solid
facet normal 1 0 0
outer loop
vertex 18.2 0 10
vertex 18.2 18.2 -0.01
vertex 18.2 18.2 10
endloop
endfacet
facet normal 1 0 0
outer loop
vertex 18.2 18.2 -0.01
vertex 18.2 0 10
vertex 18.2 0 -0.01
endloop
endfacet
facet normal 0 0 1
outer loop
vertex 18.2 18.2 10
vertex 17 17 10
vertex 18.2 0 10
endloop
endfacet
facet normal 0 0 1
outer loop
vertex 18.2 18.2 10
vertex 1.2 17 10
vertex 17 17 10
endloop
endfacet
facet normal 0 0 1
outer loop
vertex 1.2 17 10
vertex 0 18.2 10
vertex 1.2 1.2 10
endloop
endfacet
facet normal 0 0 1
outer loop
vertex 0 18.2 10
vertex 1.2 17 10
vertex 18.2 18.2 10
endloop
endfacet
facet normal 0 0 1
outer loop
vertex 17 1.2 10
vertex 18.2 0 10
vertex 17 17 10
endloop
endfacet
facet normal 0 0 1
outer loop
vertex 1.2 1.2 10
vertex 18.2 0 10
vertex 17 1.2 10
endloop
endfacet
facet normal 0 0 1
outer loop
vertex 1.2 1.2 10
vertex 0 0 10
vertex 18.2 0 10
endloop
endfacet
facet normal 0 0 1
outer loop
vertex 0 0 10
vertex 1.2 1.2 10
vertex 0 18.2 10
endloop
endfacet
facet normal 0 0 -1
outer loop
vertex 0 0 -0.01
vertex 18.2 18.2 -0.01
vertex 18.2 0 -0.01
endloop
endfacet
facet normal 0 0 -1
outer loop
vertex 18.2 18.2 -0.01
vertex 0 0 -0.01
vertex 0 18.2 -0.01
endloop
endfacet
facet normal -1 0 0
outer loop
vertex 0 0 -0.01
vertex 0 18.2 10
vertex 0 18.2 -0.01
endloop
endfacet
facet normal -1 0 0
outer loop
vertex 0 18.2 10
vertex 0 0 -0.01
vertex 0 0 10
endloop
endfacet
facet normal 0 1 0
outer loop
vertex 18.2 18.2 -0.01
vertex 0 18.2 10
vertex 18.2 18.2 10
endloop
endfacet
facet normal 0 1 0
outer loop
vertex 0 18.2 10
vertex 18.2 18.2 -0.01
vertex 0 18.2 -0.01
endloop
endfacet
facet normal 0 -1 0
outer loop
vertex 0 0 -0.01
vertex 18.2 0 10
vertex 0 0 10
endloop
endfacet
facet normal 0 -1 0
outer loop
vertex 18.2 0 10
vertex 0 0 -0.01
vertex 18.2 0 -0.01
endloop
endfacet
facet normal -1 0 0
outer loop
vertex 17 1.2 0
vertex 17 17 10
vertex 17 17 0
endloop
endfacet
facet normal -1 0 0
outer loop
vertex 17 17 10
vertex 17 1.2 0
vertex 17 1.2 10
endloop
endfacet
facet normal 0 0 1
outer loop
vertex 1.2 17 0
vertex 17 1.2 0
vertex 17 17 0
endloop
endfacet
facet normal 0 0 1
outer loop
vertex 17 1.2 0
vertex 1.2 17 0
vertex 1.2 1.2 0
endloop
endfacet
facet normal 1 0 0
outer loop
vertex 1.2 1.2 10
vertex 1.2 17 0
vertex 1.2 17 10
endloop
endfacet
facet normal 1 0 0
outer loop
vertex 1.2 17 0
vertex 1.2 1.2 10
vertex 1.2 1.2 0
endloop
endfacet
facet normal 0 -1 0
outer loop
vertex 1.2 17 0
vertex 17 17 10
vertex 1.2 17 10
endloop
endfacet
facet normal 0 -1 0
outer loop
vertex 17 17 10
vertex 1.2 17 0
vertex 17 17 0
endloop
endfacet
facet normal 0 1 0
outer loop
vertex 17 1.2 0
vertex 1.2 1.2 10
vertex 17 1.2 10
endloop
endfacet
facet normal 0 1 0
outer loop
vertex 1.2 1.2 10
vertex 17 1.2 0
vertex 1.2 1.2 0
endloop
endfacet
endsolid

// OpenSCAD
// file: ../Base/Boxes.scad
// Fischertechnik Box Foundation
// Pre-designed Boxes

use <Constants.scad>

include <PlacementOptions.scad>

box190Width = 190;
box190Depth = 130;
box130Width = 130;
box130Depth = 95;
boxUsageHeight = 33.9;
boxWallThickness = 2.4;
boxBaseThickness = 1.0;

// getBoxWallThickness()
// Gets the wall thickness of a Fischertechnik Box

function getBoxWallThickness() = boxWallThickness;

// Gets the usable height of a fischertechnik box
function getBoxUsageHeight() = boxUsageHeight;

// Gets the thickness of the Fischertechnik box base.
function getBoxBaseThickness() = boxBaseThickness;

// Gets the usable inner space of a Box 190 as an x/y-list
function getBox190Space() = [
    box190Width - 2*getBoxWallThickness(), 
    box190Depth - 2*getBoxWallThickness() ];

// Imports the Fischertechnik empty box 130x190 mm and places it at position 0,0
// 190x130 are the outer sizes, the inner space is slightly smaller. Use getBox190Space() to get the inner sizes.
// This module needs the STL file "Fischertechnik Box 130x190.stl" in the library path.
// The box is positioned that the usable inner space is at the 0,0,0 position. The

module Box190() {
    translate([-getBoxWallThickness(),-getBoxWallThickness(),-getBoxBaseThickness()])
        import("Fischertechnik Box 130x190.stl", convexity=3);
}

// Gets the usable inner space of a Box 130 as an x/y-list
function getBox130Space() = [
    box130Width - 2*getBoxWallThickness(), 
    box130Depth - 2*getBoxWallThickness() ];

// Imports the Fischertechnik empty box 95x130 mm and places it at position 0,0
// 190x130 are the outer sizes, the inner space is slightly smaller. Use getBox190Space() to get the inner sizes.
// This module needs the STL file "Fischertechnik Box 95x130.stl" in the library path.
// The box is positioned that the usable inner space is at the 0,0,0 position. The

module Box130() {
    translate([-getBoxWallThickness(),-getBoxWallThickness(),-getBoxBaseThickness()])
        import("Fischertechnik Box 95x130.stl", convexity=3);
}

// Creates a web at the specified box walls
// corner 0 = LowerLeft, 1 = UpperLeft, 2 = UpperRight, 3 = LowerRight
// side 0 = LeftOfCorner, 1 = RightOfCorner
// distance = Distance in mm from the corner
// box = inner width and depth of the box (default: Box 190)
// webWidth = length of the web (default is 3 mms)
// webThickness = thickness of the web (default is 1 mm)

module BoxWeb(corner, side, distance, box=getBox190Space(), webWidth=3, webThickness=1.0) {
    sink = getBoxWallThickness()/2;

    width = (corner % 2 == 0) ? 
            (side == LeftOfCorner ? webWidth : webThickness) :
            (side == LeftOfCorner ? webThickness : webWidth);

    depth = (corner % 2 == 0) ? 
            (side == RightOfCorner ? webWidth : webThickness) :
            (side == RightOfCorner ? webThickness : webWidth);
    
    xDiff = corner == LowerLeft ? 
                (side == LeftOfCorner ? -sink : distance) :
            (corner == UpperLeft ?                
                (side == LeftOfCorner ? distance : -sink) :
            (corner == UpperRight ?
                (side == LeftOfCorner ? box.x-webWidth+sink : box.x-distance-webThickness) :
                (side == LeftOfCorner ? box.x-distance-webThickness: box.x-webWidth+sink)));

    yDiff = corner == LowerLeft ? 
                (side == RightOfCorner ? -sink : distance) :
            (corner == UpperLeft ?
                (side == RightOfCorner ? box.y-distance : box.y-webWidth+sink) :
            (corner == UpperRight ?
                (side == RightOfCorner ? box.y-webWidth+sink : box.y-distance) :
                (side == RightOfCorner ? distance : -sink)));
    
    translate([xDiff, yDiff, -getExcess()])
        cube([width, depth, boxUsageHeight + 2*getExcess()]);
}
// file: ../Base/Rotation.scad
// Fischertechnik Box Foundation
// Geometry Helpers Rotation

include <PlacementOptions.scad>

// getRotatedSpace(space, rotation=NoRotation)
// Rotates the space dependent on the specified rotation

function getRotatedSpace(space, rotation=NoRotation) = [
    (rotation == Rotate90 || rotation == Rotate270) ? space.y : space.x,
    (rotation == Rotate90 || rotation == Rotate270) ? space.x : space.y
];

// Rotates the given space around the fixed left lower corner
// space = the space the children needs as width/depth list [width,depth]
// rotation = 0 Rotate0 degrees, 1 Rotate90 degrees, 2 Rotate180 degrees, 3 Rotate270 degrees (equivalent to -90)

module RotateFix(space, rotation=Rotate0) {
    dy = (rotation == Rotate0 || rotation == Rotate270) ? 0 :
        (rotation == Rotate90) ? space.x :
        space.y;
    dx = (rotation < Rotate180) ? 0 :
        (rotation == Rotate180) ? space.x :
        space.y;
    
    translate([dx, dy, 0])
        rotate([0, 0, rotations[rotation]])
            children();
}
// file: ../Base/Alignment.scad
// Fischertechnik Box Foundation
// Geometry Helpers Alignment

include <PlacementOptions.scad>

// getAlignedX(elementWidth, spaceWidth, align=AlignRight, offset=0)
// Gets the aligned X offset of an element with the given
// width in the given space.
// elementWidth = The width of the element to positon
// spaceWidth = The space where the element should be aligned
// align = 0 AlignLeft, 1 AlignCenter, 2 AlignRight
// offset = an optional offset from the aligned position. When
// aligned left or centered, then positive values are in X direction.
// When aligned right then positive values are in negative X direction.

function getAlignedX(elementWidth, spaceWidth, align=AlignRight, offset=0) =
    (align == AlignLeft) ?
        offset :
        ((align == AlignCenter) ?
        (spaceWidth - elementWidth)/2 + offset :
        spaceWidth - offset - elementWidth);

// getAlignedY(elementDepth, spaceDepth, align=AlignTop, offset=0)
// Gets the aligned Y offset of an element with the given
// depth in the given space.
// elementDepth = The depth of the element to positon
// spaceDepth = The space where the element should be aligned
// align = 0 AlignBottom, 1 AlignCenter, 2 AlignTop
// offset = an optional offset from the aligned position. When
// aligned bottom or centered, then positive values are in Y direction.
// When aligned top then positive values are in negative Y direction.

function getAlignedY(elementDepth, spaceDepth, align=AlignTop, offset=0) =
    (align == AlignBottom) ?
        offset :
        ((align == AlignCenter) ?
        (spaceDepth - elementDepth)/2 + offset :
        spaceDepth - offset - elementDepth);
// file: ../Base/PlacementOptions.scad
// Fischertechnik Box Foundation
// Placement Options

// Alignment
NoAlign = 0;
AlignLeft = 1;
AlignBottom = 2;
AlignCenter = 3;
AlignRight = 4;
AlignTop = 5;

// Element rotation degree steps
rotations = [0, -90, -180, -270];

// Rotation
NoRotation = 0;
Rotate0 = 0;
Rotate90 = 1;
Rotate180 = 2;
Rotate270 = 3;

// Docking (seen from above)
NoDock = -1;
DockLeft = 0;
DockTop = 1;
DockRight = 2;
DockCorner = 2;
DockBottom = 3;

// Web corners
LowerLeft = 0;
UpperLeft = 1;
UpperRight = 2;
LowerRight = 3;

// Web position relative to corner
LeftOfCorner = 0;
RightOfCorner = 1;
// file: ../Base/Placement.scad
// Fischertechnik Box Foundation
// Geometry Helpers Placement

use <Constants.scad>
use <Alignment.scad>
use <Rotation.scad>
use <Boxes.scad>

include <PlacementOptions.scad>

// Place(x=0, y=0, elementSpace=[0,0], alignX=AlignLeft, alignY=AlignBottom, rotation=Rotate0, boxSpace=getBox190Space())
// Places the child at the specified position
// y = Y-Position. This is a relative position when an X aligment is specified.
// x = X-Position. This is a relative position when an Y aligment is specified.
// elementSpace = space of the element to be placed [x,y]
// alignX = -1=NoAlign, 0 AlignLeft, 1 AlignCenter, 3 AlignRight (elementSpace and boxSpace required!)
// alignY = -1=NoAlign, 2 AlignBottom, 1 AlignCenter, 4 AlignTop (elementSpace and boxSpace required!)
// rotation = 0 Rotate0 0 degrees, 1 Rotate90 90 degrees, 
// 2 Rotate180 180 degrees, 3 Rotate270 270 degrees (equivalent to -90)
// boxSpace = Inner space of the box where the placement occurs [x,y] - default is Box 190x130 inner space

module Place(x=0, y=0, elementSpace=[0,0], 
  alignX=AlignLeft, alignY=AlignBottom, 
  rotation=NoRotation, boxSpace=getBox190Space()) {

    module Position(x, y, space, rotation=Rotate0) {
        translate([x, y, 0])
            RotateFix(space, rotation)
                children(0);
    }

    space = getRotatedSpace(elementSpace, rotation);
    alignedX = getAlignedX(space.x, boxSpace.x, alignX, x);
    alignedY = getAlignedY(space.y, boxSpace.y, alignY, y);
    Position(alignedX, alignedY, elementSpace, rotation)
        children(0);
}

// Center(space=getBox130Space(), elementSpace=[0,0])
// space = Space where the children is centered. For cylinder use centered=true and no elementSpace.
// elementSpace = space of the element to be centered [x,y]

module Center(space=getBox190Space(), elementSpace=[0,0]) {
    translate([(space.x - elementSpace.x) / 2, (space.y - elementSpace.y) / 2])
        children(0);
}

// CenterHorizontal(width=0, y=0, offset=0, space=getBox130Space())
// space = Space where the children is centered. For cylinder use centered=true and no elementSpace.
// elementSpace = space of the element to be centered [x,y]

module CenterHorizontal(width=0, y=0, offset=0, space=getBox190Space()) {
    translate([(space.x - width) / 2 + offset, y])
        children(0);
}

// CenterVertical(depth=0, x=0, offset=0, space=getBox130Space())
// space = Space where the children is centered. For cylinder use centered=true and no elementSpace.
// elementSpace = space of the element to be centered [x,y]

module CenterVerticalal(depth=0, x=0, offset=0, space=getBox190Space()) {
    translate([x, (space.y - depth) / 2 + offset])
        children(0);
}
// file: ../Base/Constants.scad
// Fischertechnik Box Foundation
// Constants

// Constant values necessary for multiple elements

// Base constants
dividerThickness = 1.2;
excess = 0.01;
fragments = 90;
tolerance = 0.8;

// Gets the thickness of a divider 
function getDividerThickness() = dividerThickness;

// Gets the excess that is used to merge walls into each other
function getExcess() = excess;

// Gets amount of fragments of a cylinder
function getFragments() = fragments;

// Gets the inner tolerance of a frame to each side
function getTolerance() = tolerance;


// Fischertechnik specific constants
axisDiameter = 4;
axisBottomDiameter = axisDiameter + 1;
standardEdgeDistance = 2.5;
standardWebDistance = 11.5;
standardCornerLength = 15;
tubeWallFactor = 1.6;

// Gets axis diameter
function getAxisDiameter() = axisDiameter;

// Gets axis bottom diameter for thicker part at the bottom
function getAxisBottomDiameter() = axisBottomDiameter;

// gets the standard distance to the wall of the box for dockable frames with webs
function getStandardEdgeDistance() = standardEdgeDistance;

// gets the standard distance of each web to the corner of the dockable frame
function getStandardWebDistance() = standardWebDistance;

// gets the standard length of the corner walls of a dockable frame
function getStandardCornerLength() = standardCornerLength;

// gets the wall thickness of a tube.
function getTubeWallThickness() = tubeWallFactor * getDividerThickness();
// main file
// Fischertechnik Box Library
// Frame for standard blocks
// 31003, 31004, 31005 etc.

use <../ModelBase/Simple.scad>

width = 15;
depth = 15;
height = 10;

// getFrameSmallBlockSpace(columns=1, rows=1)
// Gets the space of a frame for columns x rows small parts (7.5 or 5)

function getFrameStandardBlockSpace(columns=1, rows=1) = getFrameOuterVolume([width * columns, depth * rows, height]);

// FrameSmallBlock(columns=1, rows=1)
// frame for columns x rows small parts (7.5 or 5)

module FrameStandardBlock(columns=1, rows=1) {
    Frame([width * columns, depth * rows, height]);
}

// Tests
color("lightgray")
FrameStandardBlock();
